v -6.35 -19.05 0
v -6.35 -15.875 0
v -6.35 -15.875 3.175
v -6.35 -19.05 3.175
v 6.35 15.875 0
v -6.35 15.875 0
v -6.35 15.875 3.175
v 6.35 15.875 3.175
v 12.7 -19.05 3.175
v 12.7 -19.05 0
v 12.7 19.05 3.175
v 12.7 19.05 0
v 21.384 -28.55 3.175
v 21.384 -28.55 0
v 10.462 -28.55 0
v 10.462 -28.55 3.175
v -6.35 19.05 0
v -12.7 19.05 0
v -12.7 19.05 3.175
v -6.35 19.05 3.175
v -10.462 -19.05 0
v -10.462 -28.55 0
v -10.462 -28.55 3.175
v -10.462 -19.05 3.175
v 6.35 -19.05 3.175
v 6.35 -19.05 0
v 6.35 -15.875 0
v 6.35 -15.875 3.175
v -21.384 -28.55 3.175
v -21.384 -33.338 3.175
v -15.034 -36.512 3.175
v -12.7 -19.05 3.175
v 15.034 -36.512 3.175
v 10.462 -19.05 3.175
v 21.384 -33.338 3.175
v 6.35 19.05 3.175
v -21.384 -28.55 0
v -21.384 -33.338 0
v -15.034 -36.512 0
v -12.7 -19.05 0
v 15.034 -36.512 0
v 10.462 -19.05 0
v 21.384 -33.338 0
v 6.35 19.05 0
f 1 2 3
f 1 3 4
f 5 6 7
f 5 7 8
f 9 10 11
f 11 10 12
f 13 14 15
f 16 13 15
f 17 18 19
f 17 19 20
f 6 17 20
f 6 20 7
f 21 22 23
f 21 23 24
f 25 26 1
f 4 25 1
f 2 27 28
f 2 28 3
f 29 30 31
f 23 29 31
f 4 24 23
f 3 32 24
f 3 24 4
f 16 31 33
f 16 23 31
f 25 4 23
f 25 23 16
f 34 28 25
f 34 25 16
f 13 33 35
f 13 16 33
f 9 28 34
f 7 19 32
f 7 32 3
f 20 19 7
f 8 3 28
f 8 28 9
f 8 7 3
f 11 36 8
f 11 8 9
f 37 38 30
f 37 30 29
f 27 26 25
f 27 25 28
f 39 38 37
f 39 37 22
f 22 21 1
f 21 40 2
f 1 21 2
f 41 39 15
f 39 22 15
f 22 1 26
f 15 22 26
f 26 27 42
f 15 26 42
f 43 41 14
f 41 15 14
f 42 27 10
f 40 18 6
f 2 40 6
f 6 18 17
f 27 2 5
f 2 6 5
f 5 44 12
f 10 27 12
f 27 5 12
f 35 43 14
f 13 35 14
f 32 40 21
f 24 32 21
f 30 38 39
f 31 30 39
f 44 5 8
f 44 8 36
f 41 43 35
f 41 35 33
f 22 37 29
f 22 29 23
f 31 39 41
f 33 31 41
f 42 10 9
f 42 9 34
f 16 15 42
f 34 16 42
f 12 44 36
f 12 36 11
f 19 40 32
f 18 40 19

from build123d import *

# Parameters (mm, degrees)
BOSS_EXTRUDE1_DEPTH = 3.175
SKETCH2_W           = 25.4
SKETCH2_H           = 17.4625
BOSS_EXTRUDE2_DEPTH = 3.175
SKETCH4_W           = 2.238000096
SKETCH4_H           = 9.5
CUT_EXTRUDE1_DEPTH  = 3.175
SKETCH5_W           = 8.68426
SKETCH5_H           = 7.9625
BOSS_EXTRUDE3_DEPTH = 3.175
CUT_EXTRUDE2_DEPTH  = 3.175


with BuildPart() as part:
    # Sketch1 → Boss-Extrude1 (new body)
    with BuildSketch(Plane.XY):
        Polygon((-12.7, 19.05), (-6.35, 19.05), (-6.35, 15.875), (6.35, 15.875), (6.35, 19.05), (12.7, 19.05), (12.7, -19.05), (6.35, -19.05), (6.35, -15.875), (-6.35, -15.875), (-6.35, -19.05), (-12.7, -19.05), align=None)
    extrude(amount=BOSS_EXTRUDE1_DEPTH)

    # Sketch2 → Boss-Extrude2 (add)
    with BuildSketch(Plane(origin=(0, 0, 0), x_dir=(-1, 0, 0), z_dir=(0, 0, -1))):
        with Locations((0, -27.78125)):
            Rectangle(SKETCH2_W, SKETCH2_H)
    extrude(amount=-BOSS_EXTRUDE2_DEPTH)

    # Sketch4 → Cut-Extrude1 (cut)
    with BuildSketch(Plane(origin=(0, 0, 0), x_dir=(-1, 0, 0), z_dir=(0, 0, -1))):
        with Locations((-11.580999952, -23.8)):
            Rectangle(SKETCH4_W, SKETCH4_H)
    cut_extrude1 = extrude(amount=-CUT_EXTRUDE1_DEPTH, mode=Mode.SUBTRACT)

    # Sketch5 → Boss-Extrude3 (add)
    with BuildSketch(Plane(origin=(0, 0, 0), x_dir=(-1, 0, 0), z_dir=(0, 0, -1))):
        with Locations((-17.04213, -32.53125)):
            Rectangle(SKETCH5_W, SKETCH5_H)
    boss_extrude3 = extrude(amount=-BOSS_EXTRUDE3_DEPTH)

    # Sketch6 → Cut-Extrude2 (cut)
    with BuildSketch(Plane(origin=(0, 0, 0), x_dir=(-1, 0, 0), z_dir=(0, 0, -1))):
        Polygon((-21.38426, -33.3375), (-15.03426, -36.5125), (-21.38426, -36.5125), align=None)
    cut_extrude2 = extrude(amount=-CUT_EXTRUDE2_DEPTH, mode=Mode.SUBTRACT)

    # Mirror1: Cut-Extrude1, Boss-Extrude3, Cut-Extrude2 across plane
    add(cut_extrude1.mirror(Plane(origin=(0, 0, 0), x_dir=(0, 0, 1), z_dir=(1, 0, 0))), mode=Mode.SUBTRACT)
    add(boss_extrude3.mirror(Plane(origin=(0, 0, 0), x_dir=(0, 0, 1), z_dir=(1, 0, 0))))
    add(cut_extrude2.mirror(Plane(origin=(0, 0, 0), x_dir=(0, 0, 1), z_dir=(1, 0, 0))), mode=Mode.SUBTRACT)


solid = part.part
